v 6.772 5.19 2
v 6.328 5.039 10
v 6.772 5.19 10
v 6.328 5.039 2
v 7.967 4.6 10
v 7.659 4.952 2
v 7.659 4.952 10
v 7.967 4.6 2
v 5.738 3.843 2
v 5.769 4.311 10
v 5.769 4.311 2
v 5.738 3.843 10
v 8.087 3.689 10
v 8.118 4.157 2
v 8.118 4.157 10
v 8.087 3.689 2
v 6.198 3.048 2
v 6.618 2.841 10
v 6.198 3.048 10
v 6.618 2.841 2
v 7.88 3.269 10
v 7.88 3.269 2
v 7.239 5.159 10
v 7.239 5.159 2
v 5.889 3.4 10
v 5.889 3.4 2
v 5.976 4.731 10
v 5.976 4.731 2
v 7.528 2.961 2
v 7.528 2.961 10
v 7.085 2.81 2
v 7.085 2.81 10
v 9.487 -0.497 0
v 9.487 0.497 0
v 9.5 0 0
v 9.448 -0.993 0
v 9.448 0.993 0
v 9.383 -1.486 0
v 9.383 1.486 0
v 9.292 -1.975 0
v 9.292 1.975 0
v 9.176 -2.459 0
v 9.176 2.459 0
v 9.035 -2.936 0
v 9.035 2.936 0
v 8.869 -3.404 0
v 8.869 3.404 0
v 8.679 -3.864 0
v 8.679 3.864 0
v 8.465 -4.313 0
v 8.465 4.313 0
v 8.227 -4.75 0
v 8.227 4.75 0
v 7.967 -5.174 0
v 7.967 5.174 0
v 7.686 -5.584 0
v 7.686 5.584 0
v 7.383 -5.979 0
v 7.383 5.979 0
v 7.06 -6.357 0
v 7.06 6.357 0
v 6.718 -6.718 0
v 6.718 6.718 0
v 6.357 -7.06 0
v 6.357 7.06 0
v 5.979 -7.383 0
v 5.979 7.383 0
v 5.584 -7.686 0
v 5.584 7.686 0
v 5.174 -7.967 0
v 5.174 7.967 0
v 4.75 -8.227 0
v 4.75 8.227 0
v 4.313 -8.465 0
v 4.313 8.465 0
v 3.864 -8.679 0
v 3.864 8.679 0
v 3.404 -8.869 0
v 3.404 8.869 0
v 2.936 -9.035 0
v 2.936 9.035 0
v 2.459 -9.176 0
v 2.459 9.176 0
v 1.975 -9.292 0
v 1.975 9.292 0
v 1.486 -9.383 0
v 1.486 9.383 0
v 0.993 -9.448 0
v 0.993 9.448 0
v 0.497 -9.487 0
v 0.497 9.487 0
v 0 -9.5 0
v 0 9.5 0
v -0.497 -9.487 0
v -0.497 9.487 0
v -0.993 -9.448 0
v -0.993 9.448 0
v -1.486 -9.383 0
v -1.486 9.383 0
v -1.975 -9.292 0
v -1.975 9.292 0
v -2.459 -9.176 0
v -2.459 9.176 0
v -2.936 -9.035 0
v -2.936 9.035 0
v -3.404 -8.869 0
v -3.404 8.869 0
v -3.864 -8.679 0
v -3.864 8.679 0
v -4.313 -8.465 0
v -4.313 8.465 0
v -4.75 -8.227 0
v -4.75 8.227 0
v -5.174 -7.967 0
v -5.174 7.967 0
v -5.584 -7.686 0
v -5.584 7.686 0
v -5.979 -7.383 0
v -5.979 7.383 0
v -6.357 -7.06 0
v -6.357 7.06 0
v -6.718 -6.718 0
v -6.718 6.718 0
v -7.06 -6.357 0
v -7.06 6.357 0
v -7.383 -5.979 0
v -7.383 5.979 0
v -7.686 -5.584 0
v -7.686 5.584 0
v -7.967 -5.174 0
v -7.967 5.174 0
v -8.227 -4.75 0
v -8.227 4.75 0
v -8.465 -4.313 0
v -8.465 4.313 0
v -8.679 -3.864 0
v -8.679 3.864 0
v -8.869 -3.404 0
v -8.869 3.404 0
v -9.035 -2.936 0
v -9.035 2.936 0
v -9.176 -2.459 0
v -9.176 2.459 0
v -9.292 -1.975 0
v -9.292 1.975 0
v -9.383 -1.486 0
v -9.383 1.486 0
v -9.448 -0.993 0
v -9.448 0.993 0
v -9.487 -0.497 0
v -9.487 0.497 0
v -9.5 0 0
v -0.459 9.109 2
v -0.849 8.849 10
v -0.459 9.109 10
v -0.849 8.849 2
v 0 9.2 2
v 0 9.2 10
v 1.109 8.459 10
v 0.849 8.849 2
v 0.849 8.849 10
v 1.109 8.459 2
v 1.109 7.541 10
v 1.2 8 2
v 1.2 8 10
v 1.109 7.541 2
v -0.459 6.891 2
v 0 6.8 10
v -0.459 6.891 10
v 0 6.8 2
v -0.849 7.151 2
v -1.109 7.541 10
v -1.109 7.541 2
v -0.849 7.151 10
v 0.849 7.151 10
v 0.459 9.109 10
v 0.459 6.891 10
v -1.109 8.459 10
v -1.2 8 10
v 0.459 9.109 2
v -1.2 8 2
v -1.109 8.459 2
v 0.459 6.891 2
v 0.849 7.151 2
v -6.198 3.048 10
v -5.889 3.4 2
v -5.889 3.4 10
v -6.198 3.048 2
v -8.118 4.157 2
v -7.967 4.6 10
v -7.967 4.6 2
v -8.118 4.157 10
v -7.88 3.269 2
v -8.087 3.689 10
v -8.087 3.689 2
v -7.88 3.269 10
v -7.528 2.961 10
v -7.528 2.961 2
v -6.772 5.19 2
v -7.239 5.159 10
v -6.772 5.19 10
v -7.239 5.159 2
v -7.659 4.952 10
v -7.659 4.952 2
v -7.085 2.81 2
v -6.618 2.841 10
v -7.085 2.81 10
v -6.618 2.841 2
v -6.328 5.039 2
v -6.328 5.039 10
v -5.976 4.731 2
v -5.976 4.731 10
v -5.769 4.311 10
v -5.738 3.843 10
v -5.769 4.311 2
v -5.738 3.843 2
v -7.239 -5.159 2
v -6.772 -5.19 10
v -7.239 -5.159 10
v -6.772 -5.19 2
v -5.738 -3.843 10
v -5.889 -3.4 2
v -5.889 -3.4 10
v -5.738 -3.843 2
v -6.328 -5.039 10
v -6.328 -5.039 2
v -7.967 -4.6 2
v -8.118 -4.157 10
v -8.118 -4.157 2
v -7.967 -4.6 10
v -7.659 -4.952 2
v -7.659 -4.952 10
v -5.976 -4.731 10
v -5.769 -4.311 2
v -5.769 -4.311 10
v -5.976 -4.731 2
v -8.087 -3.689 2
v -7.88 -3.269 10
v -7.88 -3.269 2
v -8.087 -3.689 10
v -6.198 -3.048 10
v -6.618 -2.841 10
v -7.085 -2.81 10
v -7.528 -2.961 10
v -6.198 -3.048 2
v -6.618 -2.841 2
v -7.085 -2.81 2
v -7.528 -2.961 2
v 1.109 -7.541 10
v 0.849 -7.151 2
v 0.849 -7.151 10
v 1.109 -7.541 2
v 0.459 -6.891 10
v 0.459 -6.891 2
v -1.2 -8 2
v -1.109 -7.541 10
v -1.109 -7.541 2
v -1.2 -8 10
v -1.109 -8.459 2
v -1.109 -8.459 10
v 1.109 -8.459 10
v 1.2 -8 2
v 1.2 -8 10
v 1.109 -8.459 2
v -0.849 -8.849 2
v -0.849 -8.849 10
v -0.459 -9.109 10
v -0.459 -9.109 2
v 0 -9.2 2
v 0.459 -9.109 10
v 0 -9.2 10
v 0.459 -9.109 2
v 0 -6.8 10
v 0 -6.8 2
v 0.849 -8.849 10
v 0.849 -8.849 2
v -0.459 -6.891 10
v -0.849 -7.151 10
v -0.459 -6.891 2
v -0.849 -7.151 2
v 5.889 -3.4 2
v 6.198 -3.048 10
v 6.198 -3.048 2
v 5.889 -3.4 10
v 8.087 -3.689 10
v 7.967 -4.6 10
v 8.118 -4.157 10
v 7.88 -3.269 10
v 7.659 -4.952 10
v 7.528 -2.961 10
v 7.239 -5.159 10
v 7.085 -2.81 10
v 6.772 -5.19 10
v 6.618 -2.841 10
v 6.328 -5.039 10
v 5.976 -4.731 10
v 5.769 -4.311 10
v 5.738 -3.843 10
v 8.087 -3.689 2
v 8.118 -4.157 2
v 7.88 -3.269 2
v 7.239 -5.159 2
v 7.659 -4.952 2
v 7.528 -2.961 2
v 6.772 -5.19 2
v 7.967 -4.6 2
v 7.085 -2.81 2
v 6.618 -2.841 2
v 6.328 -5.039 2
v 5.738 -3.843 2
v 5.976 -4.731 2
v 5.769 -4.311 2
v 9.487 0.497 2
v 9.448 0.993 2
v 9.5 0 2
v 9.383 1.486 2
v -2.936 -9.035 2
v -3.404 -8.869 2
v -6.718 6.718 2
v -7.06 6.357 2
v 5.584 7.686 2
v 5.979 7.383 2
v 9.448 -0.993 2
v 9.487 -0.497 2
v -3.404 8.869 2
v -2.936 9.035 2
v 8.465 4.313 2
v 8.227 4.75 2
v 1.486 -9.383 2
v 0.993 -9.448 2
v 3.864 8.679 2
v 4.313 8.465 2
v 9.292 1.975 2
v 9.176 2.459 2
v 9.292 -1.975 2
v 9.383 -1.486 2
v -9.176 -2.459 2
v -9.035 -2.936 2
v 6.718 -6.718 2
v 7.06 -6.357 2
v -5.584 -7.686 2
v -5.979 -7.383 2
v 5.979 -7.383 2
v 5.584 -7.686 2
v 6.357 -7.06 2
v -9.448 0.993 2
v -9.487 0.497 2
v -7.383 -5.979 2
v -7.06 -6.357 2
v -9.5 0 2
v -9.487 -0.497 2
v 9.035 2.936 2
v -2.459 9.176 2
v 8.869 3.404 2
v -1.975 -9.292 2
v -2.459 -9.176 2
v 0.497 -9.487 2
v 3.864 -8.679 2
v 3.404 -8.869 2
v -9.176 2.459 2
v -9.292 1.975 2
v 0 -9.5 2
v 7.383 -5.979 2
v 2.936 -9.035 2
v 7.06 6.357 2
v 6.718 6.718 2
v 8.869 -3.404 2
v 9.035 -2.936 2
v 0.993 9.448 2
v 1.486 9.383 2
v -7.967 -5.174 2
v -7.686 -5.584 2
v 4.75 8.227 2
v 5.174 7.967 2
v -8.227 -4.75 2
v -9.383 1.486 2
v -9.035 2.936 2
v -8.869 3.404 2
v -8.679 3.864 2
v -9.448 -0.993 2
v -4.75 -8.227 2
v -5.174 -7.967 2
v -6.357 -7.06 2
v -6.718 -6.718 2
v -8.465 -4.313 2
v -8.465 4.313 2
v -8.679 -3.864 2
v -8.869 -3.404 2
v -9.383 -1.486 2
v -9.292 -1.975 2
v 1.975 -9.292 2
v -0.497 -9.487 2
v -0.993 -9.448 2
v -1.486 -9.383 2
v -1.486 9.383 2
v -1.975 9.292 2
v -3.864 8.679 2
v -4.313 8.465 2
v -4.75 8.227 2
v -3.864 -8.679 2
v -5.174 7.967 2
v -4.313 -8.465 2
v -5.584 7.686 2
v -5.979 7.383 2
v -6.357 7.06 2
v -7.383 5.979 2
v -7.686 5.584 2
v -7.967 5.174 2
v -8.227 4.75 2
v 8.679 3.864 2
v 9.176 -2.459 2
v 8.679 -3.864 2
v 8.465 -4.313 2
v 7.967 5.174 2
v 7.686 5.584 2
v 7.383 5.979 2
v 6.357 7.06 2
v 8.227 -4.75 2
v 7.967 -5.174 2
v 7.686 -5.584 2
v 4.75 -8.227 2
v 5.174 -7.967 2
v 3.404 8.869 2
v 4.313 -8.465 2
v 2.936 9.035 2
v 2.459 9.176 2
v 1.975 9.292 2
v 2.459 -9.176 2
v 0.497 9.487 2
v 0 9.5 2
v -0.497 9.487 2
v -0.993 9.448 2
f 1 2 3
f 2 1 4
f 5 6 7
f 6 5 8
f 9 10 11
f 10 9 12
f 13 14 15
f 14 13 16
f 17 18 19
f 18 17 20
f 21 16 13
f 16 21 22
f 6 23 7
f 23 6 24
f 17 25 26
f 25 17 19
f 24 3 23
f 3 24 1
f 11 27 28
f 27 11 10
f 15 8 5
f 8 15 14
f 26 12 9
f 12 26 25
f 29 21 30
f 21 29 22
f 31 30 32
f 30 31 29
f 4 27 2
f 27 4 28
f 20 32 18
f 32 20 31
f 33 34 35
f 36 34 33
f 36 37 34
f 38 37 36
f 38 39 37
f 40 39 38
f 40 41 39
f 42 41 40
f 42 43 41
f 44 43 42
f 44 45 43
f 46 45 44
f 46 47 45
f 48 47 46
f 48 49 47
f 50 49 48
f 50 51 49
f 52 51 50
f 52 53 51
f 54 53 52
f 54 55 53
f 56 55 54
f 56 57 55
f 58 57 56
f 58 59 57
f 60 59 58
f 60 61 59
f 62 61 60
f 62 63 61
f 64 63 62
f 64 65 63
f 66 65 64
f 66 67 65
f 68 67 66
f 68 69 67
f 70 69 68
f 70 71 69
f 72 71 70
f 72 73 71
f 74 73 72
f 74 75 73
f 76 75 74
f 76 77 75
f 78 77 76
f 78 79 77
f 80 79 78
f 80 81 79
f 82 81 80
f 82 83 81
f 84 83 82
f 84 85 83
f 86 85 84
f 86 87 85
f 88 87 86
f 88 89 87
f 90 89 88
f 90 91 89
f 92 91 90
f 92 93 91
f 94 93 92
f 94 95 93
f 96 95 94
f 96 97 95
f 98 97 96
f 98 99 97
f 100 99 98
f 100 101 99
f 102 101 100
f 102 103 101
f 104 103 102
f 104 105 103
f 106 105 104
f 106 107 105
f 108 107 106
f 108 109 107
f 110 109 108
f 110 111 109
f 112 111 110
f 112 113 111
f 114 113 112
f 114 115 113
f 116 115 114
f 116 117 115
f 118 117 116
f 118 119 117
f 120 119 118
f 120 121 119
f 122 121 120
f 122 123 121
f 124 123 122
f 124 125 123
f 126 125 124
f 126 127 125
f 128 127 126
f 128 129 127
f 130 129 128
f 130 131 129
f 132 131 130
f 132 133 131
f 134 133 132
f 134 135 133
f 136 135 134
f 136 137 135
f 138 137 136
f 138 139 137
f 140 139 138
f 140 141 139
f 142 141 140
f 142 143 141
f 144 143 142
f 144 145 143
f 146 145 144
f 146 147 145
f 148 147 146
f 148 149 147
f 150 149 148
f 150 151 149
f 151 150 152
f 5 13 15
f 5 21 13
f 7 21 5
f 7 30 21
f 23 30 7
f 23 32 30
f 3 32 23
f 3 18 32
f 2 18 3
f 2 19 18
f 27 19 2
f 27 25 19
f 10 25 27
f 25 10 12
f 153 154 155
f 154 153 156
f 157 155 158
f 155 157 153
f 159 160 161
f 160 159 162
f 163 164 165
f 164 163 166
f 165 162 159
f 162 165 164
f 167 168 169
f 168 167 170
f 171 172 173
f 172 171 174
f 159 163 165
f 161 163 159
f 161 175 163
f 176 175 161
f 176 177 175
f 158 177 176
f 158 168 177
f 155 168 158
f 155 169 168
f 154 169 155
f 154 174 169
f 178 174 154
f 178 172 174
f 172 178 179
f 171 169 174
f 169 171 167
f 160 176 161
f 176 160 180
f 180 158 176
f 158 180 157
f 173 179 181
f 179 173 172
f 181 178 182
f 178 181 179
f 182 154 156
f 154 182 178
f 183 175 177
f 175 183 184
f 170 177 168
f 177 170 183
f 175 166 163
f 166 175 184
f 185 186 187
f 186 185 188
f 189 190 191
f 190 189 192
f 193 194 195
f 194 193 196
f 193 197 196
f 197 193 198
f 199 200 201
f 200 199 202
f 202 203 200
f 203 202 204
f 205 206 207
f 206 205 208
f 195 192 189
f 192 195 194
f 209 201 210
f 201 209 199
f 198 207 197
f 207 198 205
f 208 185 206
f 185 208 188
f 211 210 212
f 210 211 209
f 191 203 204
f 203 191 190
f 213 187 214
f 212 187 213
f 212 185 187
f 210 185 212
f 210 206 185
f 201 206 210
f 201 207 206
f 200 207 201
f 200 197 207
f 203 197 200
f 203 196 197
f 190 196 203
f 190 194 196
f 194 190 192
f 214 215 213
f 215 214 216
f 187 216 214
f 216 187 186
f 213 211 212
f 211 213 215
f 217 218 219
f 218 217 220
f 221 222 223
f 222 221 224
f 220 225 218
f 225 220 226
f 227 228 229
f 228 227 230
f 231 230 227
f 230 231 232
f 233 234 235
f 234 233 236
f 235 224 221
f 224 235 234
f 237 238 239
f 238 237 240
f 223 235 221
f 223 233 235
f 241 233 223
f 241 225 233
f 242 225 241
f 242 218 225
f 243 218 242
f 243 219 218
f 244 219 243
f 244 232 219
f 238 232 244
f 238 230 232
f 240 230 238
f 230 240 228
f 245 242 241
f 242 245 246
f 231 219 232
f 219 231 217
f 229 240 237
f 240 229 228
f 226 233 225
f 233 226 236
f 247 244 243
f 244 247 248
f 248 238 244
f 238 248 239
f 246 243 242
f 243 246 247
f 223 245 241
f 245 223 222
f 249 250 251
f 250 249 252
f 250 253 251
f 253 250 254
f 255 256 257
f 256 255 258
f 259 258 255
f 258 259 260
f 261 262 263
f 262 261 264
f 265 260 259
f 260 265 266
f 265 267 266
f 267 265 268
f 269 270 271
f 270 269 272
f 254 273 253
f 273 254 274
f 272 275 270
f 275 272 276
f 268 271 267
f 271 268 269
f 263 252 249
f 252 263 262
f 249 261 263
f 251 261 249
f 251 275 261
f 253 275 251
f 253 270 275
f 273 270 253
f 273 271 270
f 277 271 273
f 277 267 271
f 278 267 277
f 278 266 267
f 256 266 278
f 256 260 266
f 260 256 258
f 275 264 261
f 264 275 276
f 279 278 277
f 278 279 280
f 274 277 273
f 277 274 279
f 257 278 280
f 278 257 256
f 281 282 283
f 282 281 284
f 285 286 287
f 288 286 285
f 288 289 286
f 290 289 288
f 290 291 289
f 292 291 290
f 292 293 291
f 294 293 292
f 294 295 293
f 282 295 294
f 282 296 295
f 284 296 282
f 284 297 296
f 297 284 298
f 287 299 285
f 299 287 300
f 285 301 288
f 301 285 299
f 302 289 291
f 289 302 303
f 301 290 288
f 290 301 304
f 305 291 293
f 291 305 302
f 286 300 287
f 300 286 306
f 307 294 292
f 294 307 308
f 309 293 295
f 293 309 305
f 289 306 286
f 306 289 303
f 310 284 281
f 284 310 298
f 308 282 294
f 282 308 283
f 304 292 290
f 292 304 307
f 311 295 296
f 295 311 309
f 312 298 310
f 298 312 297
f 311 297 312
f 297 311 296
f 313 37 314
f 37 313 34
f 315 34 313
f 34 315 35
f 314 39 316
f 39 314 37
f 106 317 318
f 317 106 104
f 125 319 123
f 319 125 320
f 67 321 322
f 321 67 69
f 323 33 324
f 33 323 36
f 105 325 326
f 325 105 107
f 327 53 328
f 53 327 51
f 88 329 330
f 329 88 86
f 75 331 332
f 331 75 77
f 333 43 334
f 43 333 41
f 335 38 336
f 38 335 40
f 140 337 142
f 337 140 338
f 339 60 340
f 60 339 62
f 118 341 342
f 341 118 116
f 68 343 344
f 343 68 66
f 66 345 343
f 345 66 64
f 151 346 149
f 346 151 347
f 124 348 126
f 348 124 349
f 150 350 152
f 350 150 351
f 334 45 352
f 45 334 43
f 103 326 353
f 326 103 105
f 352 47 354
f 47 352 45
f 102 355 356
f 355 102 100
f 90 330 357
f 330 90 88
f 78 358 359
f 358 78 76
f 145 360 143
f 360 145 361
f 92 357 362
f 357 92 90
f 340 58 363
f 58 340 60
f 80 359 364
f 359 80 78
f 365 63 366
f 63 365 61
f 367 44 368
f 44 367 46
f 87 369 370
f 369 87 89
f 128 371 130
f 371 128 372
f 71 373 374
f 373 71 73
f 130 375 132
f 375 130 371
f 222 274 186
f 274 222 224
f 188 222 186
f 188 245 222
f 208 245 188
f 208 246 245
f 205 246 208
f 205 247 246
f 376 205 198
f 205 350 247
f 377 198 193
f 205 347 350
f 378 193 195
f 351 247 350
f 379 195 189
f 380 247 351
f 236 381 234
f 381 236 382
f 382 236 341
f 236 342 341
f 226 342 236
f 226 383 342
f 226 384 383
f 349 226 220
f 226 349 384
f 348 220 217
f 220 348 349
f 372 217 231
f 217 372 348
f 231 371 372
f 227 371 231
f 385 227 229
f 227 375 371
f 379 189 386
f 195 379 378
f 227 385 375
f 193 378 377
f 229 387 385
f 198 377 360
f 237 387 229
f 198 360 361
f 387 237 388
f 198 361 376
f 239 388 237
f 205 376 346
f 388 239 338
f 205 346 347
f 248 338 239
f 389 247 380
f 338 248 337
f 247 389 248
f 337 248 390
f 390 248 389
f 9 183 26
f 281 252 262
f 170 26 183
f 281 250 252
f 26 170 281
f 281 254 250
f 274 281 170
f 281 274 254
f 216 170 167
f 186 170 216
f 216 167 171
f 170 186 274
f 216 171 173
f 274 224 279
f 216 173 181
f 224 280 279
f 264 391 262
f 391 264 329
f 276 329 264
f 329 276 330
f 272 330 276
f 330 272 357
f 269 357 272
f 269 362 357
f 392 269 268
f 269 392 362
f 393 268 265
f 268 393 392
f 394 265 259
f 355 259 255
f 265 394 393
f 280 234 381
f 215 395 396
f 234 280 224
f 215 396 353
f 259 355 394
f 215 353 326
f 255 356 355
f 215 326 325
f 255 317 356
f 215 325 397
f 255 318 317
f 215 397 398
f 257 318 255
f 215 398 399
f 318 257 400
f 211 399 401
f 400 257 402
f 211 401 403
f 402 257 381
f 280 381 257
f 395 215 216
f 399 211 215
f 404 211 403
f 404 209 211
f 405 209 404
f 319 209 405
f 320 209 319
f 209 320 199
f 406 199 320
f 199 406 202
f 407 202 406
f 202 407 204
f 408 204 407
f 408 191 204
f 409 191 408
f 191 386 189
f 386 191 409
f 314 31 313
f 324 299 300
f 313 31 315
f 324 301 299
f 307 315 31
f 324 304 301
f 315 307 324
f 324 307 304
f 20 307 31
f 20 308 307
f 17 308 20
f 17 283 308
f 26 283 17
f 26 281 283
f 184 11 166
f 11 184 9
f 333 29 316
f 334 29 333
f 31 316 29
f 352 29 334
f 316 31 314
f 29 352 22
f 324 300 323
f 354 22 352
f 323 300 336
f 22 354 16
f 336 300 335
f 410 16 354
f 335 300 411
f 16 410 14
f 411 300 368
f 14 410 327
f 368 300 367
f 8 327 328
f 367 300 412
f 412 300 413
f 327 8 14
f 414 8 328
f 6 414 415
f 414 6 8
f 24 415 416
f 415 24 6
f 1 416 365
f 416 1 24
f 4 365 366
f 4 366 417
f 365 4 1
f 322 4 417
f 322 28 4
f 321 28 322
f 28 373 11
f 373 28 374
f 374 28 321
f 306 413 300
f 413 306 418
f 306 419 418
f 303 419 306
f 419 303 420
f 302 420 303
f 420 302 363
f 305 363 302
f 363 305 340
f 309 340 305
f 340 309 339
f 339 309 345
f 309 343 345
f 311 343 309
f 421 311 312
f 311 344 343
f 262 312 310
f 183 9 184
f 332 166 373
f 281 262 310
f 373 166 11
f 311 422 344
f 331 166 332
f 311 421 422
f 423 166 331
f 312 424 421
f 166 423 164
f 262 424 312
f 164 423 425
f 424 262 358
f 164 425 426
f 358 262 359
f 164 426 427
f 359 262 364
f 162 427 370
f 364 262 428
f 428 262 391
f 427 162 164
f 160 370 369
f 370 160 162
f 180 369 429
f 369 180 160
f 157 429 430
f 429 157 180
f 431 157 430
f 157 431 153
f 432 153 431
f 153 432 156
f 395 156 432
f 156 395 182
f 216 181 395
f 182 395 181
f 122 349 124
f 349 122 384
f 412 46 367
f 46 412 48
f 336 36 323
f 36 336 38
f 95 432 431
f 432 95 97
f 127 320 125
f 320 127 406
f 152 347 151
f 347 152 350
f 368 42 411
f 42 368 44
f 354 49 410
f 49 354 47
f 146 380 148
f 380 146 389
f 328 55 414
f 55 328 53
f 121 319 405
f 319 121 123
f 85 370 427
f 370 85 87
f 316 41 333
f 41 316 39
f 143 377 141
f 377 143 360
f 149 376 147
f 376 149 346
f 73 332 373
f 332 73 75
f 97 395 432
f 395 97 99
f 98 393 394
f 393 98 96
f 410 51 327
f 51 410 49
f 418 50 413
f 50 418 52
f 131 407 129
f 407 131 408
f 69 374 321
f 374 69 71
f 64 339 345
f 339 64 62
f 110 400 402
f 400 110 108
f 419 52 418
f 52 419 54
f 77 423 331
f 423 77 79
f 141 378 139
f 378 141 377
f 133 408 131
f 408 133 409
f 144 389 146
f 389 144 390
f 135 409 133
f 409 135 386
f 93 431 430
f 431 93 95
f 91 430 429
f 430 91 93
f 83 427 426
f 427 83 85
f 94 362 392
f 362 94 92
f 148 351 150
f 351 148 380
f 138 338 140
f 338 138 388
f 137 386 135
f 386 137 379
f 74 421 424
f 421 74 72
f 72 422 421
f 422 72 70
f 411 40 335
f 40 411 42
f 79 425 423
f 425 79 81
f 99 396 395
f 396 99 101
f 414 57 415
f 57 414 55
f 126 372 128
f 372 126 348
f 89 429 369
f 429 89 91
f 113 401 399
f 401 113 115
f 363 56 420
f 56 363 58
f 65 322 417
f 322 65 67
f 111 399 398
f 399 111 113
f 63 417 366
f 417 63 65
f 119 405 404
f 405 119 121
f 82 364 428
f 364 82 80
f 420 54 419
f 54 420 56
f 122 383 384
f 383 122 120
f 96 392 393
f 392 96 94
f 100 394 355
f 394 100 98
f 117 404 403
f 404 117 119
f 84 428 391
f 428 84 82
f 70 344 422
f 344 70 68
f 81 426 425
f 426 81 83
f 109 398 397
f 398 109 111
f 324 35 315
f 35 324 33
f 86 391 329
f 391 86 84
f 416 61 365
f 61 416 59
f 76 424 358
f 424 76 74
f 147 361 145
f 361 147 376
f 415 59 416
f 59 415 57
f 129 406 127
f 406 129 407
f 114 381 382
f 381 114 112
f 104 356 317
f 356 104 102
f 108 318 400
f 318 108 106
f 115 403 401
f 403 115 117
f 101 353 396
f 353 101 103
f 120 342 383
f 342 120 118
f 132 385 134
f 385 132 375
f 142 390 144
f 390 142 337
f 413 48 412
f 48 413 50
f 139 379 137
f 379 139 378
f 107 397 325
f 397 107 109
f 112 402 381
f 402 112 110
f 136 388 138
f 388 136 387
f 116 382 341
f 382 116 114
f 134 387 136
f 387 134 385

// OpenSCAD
$fa = 1;
$fs = 0.5;

a = 60;
rp = 1.5;
R = 5 + rp / sin(a / 2);

cylinder(r=R + rp, h=2);

for (i=[0:8]) {
    rotate([0, 0, a * i + a / 2])
    translate([R, 0, 0])
    cylinder(r=rp * .8, h=10);
}
/*
color([0, 0, 1])
rotate([0, 0, a / 2])
translate([0, 0, 8])
cube([5, 20, 0.4], center=true);

color([0, 0, 1])
rotate([0, 0, a + a / 2])
translate([0, 0, 8])
cube([5, 20, 0.4], center=true);

color([0, 0, 1])
translate([0, 0, 8])
cylinder(r=5, h=0.4, center=true);
*/
